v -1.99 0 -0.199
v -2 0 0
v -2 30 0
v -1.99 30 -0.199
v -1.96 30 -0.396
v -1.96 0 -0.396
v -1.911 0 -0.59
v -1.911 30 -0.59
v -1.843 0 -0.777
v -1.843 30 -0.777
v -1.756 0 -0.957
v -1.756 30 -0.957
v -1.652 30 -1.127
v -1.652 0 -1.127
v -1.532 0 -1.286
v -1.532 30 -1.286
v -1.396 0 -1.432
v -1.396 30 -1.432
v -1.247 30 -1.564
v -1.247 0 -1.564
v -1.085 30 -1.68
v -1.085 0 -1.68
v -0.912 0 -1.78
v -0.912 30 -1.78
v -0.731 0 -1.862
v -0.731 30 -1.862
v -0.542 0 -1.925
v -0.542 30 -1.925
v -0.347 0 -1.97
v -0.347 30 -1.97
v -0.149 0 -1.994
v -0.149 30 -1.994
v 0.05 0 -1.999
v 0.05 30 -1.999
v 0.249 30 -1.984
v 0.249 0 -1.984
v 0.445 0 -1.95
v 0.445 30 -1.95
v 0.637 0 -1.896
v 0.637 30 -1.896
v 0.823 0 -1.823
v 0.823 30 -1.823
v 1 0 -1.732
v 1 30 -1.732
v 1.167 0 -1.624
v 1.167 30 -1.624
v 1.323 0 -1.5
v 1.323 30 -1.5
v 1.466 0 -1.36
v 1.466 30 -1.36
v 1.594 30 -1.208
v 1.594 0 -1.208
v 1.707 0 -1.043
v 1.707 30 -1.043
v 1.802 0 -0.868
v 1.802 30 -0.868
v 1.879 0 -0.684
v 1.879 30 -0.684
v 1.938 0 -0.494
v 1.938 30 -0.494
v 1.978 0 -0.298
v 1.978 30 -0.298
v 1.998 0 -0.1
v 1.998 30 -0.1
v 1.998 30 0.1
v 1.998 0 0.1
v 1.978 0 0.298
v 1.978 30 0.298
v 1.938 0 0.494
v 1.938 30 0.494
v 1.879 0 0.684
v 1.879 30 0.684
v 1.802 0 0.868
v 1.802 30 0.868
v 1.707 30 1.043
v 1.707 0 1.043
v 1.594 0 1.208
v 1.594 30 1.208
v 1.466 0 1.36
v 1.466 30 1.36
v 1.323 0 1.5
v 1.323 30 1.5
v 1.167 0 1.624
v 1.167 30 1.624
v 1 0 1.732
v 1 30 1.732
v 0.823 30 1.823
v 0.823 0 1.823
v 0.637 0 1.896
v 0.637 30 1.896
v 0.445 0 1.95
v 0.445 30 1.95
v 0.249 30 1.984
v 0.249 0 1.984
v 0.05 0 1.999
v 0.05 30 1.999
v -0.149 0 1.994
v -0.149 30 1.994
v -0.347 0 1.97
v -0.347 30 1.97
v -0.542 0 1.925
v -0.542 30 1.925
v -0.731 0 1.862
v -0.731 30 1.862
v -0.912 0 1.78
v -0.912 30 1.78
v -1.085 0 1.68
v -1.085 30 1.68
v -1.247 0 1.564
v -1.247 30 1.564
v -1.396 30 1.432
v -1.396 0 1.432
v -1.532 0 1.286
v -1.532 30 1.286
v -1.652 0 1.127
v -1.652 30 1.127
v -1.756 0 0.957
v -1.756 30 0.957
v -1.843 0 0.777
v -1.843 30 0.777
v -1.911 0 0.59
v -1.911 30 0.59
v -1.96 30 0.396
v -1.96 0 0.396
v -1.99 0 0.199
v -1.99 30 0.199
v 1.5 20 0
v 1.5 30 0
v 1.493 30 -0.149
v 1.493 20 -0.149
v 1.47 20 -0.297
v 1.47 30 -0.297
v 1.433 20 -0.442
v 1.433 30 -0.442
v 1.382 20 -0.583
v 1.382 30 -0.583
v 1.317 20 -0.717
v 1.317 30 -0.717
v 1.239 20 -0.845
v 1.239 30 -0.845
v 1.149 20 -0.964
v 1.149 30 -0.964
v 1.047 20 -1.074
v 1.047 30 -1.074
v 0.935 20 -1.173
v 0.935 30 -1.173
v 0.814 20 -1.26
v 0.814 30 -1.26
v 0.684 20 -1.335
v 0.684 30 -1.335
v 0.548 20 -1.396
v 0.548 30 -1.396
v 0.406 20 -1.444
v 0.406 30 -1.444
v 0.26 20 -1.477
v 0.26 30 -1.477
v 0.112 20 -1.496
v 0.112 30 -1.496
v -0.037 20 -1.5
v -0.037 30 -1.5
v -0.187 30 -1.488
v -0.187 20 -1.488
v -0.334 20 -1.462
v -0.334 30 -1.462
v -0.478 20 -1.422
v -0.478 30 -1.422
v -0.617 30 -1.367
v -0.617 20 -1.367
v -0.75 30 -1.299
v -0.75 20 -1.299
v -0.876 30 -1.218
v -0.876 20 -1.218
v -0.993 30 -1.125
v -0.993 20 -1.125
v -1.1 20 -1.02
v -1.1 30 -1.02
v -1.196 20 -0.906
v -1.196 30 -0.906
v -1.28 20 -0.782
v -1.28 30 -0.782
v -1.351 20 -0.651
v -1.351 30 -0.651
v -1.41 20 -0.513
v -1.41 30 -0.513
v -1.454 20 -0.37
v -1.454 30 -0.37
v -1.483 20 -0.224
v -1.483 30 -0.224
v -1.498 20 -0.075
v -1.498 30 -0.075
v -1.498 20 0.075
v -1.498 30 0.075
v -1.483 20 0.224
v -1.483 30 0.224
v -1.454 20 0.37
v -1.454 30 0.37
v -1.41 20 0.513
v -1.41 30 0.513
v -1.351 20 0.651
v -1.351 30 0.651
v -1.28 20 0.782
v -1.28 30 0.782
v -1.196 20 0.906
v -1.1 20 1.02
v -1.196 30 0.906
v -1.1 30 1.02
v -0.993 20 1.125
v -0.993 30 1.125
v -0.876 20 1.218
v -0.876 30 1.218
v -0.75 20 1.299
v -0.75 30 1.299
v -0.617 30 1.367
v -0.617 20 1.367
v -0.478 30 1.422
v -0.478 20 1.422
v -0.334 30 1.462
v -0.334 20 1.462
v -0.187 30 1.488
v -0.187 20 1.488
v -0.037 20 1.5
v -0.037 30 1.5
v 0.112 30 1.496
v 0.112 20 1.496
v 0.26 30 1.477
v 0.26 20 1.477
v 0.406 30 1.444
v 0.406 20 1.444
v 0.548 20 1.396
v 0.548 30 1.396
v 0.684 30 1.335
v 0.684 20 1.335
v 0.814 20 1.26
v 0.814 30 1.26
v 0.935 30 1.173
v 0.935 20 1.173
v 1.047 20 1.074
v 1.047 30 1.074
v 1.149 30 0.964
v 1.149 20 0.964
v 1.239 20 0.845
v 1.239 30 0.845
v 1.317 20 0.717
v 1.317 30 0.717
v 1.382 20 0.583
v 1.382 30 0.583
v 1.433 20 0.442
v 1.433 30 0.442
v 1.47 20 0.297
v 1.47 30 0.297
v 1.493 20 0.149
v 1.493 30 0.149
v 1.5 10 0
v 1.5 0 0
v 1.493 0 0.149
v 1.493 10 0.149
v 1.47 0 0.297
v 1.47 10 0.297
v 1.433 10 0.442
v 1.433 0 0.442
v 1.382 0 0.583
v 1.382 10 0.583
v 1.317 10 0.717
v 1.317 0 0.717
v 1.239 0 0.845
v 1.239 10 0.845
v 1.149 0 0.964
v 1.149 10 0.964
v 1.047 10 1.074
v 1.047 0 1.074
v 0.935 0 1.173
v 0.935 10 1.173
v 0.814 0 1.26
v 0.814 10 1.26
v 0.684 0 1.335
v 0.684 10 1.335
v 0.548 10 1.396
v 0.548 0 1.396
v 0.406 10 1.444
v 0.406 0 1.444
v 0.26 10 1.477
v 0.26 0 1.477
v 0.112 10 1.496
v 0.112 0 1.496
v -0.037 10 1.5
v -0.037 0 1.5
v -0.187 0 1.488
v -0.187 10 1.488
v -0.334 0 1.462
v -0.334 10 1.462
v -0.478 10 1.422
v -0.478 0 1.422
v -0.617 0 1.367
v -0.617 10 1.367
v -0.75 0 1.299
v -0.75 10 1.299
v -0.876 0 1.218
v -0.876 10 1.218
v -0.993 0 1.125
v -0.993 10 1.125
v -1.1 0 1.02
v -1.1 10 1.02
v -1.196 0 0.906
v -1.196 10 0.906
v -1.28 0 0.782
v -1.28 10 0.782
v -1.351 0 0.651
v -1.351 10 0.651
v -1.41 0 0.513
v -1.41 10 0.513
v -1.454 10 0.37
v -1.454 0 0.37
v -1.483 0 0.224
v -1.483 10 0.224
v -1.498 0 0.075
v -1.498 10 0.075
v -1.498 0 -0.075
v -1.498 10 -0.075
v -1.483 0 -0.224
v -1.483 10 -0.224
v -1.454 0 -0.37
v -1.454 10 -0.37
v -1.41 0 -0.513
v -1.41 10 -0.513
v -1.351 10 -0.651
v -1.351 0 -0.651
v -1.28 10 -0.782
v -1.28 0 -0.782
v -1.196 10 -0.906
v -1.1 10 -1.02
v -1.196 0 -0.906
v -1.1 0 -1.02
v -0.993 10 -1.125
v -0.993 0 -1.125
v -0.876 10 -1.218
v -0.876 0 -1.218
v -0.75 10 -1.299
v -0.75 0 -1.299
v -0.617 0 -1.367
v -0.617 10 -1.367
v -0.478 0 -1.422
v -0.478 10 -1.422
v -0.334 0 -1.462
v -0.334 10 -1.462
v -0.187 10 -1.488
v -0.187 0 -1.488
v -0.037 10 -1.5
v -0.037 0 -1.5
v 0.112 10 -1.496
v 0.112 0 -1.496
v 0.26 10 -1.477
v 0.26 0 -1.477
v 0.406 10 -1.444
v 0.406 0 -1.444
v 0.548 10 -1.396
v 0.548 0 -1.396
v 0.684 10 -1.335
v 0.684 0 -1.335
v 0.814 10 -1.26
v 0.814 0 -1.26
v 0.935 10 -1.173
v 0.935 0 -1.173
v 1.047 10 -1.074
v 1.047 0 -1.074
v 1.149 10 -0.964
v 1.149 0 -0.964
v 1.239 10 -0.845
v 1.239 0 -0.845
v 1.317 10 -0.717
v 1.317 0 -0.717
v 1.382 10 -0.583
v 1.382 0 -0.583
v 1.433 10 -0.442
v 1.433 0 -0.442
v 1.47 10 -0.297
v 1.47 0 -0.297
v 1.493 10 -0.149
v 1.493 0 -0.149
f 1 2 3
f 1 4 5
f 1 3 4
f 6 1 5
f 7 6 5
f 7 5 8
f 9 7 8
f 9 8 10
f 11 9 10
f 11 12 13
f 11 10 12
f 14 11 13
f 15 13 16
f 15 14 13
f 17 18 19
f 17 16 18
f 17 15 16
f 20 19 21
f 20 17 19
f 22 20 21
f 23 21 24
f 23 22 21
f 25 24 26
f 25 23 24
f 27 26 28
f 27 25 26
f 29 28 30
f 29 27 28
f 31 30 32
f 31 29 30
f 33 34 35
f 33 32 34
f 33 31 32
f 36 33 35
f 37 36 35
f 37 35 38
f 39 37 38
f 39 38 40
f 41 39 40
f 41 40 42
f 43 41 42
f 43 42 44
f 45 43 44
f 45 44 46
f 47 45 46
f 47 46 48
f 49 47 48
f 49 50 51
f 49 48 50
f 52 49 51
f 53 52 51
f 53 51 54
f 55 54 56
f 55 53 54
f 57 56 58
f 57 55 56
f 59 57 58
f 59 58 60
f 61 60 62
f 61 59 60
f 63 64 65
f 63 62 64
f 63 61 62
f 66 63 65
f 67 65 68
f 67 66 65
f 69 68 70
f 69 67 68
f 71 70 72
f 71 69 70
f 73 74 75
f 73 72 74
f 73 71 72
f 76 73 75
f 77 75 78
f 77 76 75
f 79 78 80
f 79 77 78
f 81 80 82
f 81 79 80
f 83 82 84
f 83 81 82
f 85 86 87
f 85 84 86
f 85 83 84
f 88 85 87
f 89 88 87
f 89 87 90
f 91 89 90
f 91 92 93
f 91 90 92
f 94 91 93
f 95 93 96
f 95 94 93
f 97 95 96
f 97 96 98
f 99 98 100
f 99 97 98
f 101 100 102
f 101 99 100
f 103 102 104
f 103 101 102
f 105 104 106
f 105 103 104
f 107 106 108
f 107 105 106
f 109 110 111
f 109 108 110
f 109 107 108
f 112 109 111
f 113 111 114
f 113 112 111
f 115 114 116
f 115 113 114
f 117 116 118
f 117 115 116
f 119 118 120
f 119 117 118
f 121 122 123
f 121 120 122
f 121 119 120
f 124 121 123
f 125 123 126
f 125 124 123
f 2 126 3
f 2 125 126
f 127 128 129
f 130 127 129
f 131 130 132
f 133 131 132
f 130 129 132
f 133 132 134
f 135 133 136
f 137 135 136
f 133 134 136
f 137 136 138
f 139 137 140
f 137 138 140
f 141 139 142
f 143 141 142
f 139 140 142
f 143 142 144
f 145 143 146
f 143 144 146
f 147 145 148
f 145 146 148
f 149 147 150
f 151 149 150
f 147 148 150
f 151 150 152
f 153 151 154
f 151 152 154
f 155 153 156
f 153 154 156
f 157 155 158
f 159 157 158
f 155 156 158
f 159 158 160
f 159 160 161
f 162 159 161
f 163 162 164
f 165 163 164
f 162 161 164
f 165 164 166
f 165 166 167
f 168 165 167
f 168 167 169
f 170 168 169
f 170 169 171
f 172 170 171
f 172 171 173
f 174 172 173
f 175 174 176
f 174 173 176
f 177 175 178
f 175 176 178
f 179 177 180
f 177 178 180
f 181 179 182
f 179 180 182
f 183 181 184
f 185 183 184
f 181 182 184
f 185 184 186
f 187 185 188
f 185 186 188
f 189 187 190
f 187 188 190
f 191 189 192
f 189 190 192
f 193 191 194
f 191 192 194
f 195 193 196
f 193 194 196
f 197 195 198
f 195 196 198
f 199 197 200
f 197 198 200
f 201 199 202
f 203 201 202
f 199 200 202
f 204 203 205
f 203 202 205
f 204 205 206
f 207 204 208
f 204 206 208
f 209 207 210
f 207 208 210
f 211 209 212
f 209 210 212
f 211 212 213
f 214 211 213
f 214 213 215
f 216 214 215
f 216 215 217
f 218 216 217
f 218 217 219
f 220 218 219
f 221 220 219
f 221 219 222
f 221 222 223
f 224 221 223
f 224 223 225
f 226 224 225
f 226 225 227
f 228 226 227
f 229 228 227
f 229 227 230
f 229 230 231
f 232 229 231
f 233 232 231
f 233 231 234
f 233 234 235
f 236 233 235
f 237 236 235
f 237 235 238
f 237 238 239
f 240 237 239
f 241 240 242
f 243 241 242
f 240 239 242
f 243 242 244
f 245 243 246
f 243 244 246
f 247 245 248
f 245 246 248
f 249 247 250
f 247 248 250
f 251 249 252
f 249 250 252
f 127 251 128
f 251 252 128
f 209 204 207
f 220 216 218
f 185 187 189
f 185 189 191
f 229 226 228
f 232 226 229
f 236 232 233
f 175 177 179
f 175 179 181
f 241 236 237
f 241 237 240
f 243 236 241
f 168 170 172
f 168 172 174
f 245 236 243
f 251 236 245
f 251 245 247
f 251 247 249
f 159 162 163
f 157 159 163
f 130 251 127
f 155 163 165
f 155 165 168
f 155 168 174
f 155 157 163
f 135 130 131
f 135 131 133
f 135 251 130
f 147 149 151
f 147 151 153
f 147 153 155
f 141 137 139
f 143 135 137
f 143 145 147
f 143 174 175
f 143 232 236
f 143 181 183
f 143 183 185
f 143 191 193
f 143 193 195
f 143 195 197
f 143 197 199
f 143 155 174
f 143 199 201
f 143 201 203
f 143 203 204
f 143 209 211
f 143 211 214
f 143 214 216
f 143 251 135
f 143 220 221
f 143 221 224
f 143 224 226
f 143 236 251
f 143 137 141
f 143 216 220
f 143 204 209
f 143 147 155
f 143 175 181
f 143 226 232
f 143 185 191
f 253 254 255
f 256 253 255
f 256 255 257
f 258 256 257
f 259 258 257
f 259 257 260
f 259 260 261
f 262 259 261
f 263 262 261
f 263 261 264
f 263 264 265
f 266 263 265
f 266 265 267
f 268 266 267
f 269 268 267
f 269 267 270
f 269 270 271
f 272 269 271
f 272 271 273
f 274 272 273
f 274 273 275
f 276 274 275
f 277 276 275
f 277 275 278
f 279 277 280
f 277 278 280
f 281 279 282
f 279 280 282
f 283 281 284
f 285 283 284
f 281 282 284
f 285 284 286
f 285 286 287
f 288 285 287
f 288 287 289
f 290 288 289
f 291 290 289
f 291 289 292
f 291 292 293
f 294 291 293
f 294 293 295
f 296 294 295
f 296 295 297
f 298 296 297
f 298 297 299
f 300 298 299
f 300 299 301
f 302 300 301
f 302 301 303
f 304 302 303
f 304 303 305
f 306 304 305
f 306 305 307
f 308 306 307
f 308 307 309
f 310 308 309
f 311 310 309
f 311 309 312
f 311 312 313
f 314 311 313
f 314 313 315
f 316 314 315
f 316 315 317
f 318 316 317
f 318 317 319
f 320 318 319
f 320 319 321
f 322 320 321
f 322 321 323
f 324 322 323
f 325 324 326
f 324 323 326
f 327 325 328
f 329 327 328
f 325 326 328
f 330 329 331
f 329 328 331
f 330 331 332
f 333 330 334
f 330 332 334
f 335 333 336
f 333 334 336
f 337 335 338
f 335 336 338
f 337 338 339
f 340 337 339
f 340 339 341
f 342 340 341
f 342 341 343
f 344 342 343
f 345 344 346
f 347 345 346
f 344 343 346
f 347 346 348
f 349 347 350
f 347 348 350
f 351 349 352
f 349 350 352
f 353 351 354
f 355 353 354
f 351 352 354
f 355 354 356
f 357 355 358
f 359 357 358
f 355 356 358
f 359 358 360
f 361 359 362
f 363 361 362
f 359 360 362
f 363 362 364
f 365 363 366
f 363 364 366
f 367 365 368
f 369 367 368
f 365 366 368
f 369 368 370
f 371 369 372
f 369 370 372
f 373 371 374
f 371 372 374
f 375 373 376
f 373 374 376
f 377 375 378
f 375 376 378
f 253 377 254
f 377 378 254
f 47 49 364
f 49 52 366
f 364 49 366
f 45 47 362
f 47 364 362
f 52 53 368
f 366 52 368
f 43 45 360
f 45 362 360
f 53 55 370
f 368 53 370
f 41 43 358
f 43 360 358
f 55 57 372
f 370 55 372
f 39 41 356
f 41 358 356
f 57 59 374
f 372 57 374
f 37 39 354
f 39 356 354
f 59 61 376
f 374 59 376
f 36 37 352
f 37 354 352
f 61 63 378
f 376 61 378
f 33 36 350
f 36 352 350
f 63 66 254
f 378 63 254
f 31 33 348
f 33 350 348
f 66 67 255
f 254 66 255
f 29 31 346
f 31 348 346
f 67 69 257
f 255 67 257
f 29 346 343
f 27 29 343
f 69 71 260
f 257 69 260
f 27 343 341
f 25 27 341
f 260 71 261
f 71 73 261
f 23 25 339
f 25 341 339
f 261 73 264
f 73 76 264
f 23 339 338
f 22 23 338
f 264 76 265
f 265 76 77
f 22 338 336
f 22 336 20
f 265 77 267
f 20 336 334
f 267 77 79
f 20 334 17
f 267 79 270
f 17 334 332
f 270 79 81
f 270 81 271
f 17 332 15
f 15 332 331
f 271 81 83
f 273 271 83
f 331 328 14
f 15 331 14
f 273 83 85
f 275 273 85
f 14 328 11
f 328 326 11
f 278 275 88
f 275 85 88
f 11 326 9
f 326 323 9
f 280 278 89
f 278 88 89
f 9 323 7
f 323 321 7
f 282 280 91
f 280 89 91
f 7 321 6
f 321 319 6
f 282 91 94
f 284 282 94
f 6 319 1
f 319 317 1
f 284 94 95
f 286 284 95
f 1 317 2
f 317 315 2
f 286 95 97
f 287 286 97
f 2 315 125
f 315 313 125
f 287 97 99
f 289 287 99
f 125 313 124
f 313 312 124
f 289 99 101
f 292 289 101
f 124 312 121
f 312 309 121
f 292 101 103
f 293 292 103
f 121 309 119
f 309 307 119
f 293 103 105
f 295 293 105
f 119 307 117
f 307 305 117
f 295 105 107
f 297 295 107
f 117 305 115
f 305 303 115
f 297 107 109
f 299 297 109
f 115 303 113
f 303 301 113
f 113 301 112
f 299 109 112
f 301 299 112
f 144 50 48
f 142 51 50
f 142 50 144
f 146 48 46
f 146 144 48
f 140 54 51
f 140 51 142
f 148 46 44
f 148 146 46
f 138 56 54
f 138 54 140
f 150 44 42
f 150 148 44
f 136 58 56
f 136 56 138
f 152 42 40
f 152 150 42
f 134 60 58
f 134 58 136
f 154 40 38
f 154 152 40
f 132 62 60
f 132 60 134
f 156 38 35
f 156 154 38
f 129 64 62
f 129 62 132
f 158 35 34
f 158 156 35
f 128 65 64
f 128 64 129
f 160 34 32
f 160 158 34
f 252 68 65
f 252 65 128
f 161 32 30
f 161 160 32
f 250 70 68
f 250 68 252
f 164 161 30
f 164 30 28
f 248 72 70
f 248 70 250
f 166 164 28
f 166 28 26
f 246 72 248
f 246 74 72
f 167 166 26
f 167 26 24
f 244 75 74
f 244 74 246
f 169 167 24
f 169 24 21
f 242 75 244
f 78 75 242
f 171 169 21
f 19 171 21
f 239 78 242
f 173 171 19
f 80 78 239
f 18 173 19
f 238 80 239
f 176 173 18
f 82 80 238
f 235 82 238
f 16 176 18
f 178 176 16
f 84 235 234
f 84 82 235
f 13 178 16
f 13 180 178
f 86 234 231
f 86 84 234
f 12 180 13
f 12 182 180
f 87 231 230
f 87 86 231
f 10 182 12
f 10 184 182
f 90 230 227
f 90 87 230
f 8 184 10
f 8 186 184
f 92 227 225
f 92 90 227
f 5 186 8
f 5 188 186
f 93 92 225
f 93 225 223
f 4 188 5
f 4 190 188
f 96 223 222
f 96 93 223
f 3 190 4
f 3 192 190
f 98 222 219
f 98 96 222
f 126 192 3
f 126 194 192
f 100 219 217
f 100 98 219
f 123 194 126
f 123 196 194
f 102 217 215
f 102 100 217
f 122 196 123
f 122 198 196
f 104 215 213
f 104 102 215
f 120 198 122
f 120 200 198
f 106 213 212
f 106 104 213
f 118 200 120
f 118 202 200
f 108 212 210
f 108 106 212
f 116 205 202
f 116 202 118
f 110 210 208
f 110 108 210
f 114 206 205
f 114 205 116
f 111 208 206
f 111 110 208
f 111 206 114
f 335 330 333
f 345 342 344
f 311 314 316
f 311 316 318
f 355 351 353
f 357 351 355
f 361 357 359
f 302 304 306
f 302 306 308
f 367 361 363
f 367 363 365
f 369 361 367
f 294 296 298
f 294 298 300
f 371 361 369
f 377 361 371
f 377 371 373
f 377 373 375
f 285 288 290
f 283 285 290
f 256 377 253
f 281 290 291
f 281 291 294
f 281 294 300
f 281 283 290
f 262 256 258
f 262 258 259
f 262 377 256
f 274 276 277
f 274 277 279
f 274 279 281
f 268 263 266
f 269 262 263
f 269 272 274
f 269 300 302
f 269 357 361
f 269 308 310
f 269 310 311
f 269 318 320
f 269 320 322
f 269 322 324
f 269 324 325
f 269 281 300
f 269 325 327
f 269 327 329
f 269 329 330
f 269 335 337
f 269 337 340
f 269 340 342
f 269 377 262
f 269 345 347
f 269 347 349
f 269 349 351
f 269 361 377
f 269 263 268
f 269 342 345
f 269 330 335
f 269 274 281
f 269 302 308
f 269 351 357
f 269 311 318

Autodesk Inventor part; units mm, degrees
ref_plane "YZ Plane" through (0, 0, 0) normal (1, 0, 0) x (0, 1, 0)
ref_plane "XZ Plane" through (0, 0, 0) normal (0, 1, 0) x (-1, 0, 0)
ref_plane "XY Plane" through (0, 0, 0) normal (0, 0, 1) x (1, 0, 0)
sketch "Sketch1" plane through (0, 0, 0) normal (0, 1, 0) x (-1, 0, 0)
  circle A0 centre (0, 0) radius 2
  circle A1 centre (0, 0) radius 1.75
  dimension "d0" = 4
  dimension "d3" = 3.5
extrude "Beams" add sketch "Sketch1" along normal blind 30 contours A0 | A1
sketch "Sketch3" plane through (0, 0, 0) normal (0, -1, 0) x (1, 0, 0)
  circle A0 centre (0, 0) radius 1.5
  dimension "d4" = 3
extrude "Screw Hole" cut sketch "Sketch3" against normal blind 10
thread "Thread1" size "M3x0.5" class "6H" standard "ANSI Metric M Profile" full length
sketch "Sketch4" plane through (0, 30, 0) normal (0, 1, 0) x (1, 0, 0)
  circle A0 centre (0, 0) radius 1.5
  dimension "d9" = 3
extrude "Extrusion3" cut sketch "Sketch4" against normal blind 10
thread "Thread2" size "M3x0.5" class "6H" standard "ANSI Metric M Profile" full length
properties part number "Beams"
